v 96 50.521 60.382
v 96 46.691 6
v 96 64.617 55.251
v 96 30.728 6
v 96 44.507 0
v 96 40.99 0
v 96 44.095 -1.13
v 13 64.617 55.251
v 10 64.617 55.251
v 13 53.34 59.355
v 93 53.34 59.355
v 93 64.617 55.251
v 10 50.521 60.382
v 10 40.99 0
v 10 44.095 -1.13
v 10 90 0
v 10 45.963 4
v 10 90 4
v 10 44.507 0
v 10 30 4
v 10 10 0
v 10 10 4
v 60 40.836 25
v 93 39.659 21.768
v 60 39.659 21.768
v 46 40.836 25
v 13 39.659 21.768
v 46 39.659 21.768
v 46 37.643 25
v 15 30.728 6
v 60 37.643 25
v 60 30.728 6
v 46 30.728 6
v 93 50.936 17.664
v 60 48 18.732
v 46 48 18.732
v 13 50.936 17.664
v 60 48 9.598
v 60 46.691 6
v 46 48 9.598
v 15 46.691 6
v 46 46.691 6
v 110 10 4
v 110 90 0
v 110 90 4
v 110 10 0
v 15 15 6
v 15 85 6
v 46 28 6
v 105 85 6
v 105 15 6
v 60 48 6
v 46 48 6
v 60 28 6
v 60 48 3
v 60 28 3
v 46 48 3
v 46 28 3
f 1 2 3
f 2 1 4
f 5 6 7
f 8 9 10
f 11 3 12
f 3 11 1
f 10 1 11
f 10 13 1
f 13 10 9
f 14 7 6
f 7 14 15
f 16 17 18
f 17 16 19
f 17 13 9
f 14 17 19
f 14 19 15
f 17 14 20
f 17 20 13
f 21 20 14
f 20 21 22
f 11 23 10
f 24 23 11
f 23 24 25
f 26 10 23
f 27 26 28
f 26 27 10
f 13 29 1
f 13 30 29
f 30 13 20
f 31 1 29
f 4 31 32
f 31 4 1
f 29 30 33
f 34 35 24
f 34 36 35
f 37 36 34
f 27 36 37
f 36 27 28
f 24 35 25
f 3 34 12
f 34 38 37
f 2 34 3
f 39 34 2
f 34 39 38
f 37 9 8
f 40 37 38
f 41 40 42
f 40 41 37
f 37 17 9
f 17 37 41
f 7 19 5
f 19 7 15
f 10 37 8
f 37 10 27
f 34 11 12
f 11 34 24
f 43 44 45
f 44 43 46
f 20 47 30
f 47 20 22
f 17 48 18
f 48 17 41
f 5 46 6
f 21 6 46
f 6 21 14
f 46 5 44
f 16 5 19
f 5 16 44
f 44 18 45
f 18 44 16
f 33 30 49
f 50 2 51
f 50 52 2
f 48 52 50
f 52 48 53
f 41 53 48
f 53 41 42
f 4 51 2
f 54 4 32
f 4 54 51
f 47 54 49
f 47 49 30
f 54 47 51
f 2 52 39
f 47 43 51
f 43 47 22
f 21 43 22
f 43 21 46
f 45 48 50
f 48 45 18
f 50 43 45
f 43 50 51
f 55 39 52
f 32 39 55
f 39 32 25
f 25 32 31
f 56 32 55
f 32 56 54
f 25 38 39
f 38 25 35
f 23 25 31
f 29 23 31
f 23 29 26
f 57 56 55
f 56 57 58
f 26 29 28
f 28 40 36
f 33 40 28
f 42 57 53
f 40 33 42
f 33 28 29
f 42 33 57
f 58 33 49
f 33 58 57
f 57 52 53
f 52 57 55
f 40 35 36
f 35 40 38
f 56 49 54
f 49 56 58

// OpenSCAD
// Universal Phone Stand - Adjustable Angle
// Best seller on Etsy & MakerWorld
// Print: 0.2mm, 3 walls, 20% infill, no supports

PHONE_W   = 80;   // Phone cradle width
CRADLE_D  = 12;   // Depth of cradle pocket
CRADLE_H  = 20;   // Height of cradle lip
ANGLE     = 70;   // Viewing angle (degrees from horizontal)
BASE_D    = 80;
BASE_H    = 4;
WALL_T    = 3;
CABLE_D   = 14;   // Bottom cutout for charging cable

module base() {
    hull() {
        cube([PHONE_W + 20, BASE_D, BASE_H]);
        translate([5, 5, 0]) cube([PHONE_W + 10, BASE_D - 10, BASE_H + 2]);
    }
}

module stand_body() {
    rotate([-(90 - ANGLE), 0, 0])
        union() {
            // Back wall
            cube([PHONE_W + 2*WALL_T, WALL_T, 60]);
            // Cradle shelf
            translate([0, WALL_T, 0])
                cube([PHONE_W + 2*WALL_T, CRADLE_D, CRADLE_H]);
            // Side walls
            cube([WALL_T, CRADLE_D + WALL_T, 60]);
            translate([PHONE_W + WALL_T, 0, 0])
                cube([WALL_T, CRADLE_D + WALL_T, 60]);
        }
}

difference() {
    union() {
        translate([10, 10, 0]) base();
        translate([10, 30, BASE_H]) stand_body();
    }
    // Cable notch at bottom of cradle
    translate([10 + PHONE_W/2 + WALL_T - CABLE_D/2, 28, BASE_H - 1])
        cube([CABLE_D, 20, CRADLE_H + 2]);
}
